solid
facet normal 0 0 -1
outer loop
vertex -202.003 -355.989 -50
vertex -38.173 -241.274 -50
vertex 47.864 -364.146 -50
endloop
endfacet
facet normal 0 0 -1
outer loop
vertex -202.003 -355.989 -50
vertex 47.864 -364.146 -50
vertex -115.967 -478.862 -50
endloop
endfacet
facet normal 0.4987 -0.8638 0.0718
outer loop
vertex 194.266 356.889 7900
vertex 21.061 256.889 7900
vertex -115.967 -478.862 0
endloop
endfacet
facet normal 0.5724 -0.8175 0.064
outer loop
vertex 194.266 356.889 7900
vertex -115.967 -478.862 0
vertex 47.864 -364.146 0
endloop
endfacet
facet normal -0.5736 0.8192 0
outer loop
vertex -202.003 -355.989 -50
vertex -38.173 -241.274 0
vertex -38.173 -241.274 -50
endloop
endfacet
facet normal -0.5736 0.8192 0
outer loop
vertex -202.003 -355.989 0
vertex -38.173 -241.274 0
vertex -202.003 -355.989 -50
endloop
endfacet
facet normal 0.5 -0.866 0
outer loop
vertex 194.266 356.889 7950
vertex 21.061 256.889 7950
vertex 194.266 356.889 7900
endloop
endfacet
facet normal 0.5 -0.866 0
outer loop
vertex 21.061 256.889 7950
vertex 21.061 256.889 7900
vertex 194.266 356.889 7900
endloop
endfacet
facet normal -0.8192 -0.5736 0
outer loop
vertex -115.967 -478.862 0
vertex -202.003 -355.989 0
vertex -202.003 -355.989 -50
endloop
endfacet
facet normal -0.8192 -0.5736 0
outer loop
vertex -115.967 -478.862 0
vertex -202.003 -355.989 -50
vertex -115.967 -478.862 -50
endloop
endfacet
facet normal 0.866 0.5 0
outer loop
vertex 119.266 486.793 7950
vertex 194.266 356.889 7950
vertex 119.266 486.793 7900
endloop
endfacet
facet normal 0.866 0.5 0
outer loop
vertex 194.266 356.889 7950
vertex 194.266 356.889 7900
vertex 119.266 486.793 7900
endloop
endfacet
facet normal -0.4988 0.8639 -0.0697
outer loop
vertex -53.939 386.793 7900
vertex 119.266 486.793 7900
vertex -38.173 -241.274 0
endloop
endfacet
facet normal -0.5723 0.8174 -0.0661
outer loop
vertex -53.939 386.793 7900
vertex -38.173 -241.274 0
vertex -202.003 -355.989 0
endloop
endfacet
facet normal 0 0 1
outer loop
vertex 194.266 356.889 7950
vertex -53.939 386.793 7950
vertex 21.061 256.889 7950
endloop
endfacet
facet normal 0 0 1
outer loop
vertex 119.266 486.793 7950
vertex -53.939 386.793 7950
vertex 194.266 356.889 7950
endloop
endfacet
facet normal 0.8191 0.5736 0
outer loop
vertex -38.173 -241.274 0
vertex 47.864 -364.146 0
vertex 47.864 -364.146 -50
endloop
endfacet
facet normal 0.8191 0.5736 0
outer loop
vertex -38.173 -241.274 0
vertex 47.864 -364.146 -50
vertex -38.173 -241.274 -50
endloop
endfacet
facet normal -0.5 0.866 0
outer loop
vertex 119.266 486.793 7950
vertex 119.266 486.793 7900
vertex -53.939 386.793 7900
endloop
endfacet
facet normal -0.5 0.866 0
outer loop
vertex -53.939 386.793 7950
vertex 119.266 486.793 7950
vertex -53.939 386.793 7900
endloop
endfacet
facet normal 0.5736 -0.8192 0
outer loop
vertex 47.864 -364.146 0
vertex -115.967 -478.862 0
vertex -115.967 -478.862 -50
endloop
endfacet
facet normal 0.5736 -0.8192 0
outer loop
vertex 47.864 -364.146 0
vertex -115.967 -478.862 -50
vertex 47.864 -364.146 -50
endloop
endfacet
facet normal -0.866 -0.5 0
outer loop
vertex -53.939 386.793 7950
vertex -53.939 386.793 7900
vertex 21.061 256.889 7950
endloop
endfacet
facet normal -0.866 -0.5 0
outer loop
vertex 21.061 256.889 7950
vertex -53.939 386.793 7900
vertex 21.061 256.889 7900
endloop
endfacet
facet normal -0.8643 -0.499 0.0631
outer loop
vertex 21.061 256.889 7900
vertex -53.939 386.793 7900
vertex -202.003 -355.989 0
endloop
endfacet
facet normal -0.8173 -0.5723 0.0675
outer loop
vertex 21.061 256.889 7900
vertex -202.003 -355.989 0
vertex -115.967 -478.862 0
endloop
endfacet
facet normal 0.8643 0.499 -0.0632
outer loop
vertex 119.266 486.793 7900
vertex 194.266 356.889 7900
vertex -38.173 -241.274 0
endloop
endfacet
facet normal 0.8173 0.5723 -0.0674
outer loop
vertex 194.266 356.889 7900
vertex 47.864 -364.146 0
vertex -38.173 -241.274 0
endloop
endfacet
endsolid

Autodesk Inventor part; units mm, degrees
ref_plane "YZ Plane" through (0, 0, 0) normal (1, 0, 0) x (0, 1, 0)
ref_plane "XZ Plane" through (0, 0, 0) normal (0, 1, 0) x (-1, 0, 0)
sketch "Sketch1" plane through (0, 0, 0) normal (0, 0, 1) x (1, 0, 0)
  line L0 (-202.0032, -355.9888) -> (-38.1728, -241.2736)
  line L1 (-38.1728, -241.2736) -> (47.8637, -364.1464)
  line L2 (-115.9667, -478.8616) -> (-202.0032, -355.9888)
  line L3 (47.8637, -364.1464) -> (-115.9667, -478.8616)
  point P0 (0, 0)
ref_plane "Work Plane2" through (0, 0, 7900) normal (0, 0, 1) x (1, 0, 0)
ref_plane "Work Plane1" through (0, 0, 0) normal (0, 0, 1) x (1, 0, 0)
sketch "Sketch2" plane through (0, 0, 7900) normal (0, 0, 1) x (1, 0, 0)
  line L0 (119.2658, 486.7931) -> (-53.9393, 386.7931) construction
  line L1 (194.2658, 356.8893) -> (119.2658, 486.7931) construction
  line L2 (21.0607, 256.8893) -> (194.2658, 356.8893) construction
  line L3 (-53.9393, 386.7931) -> (21.0607, 256.8893) construction
  line L4 (21.0607, 256.8893) -> (194.2658, 356.8893)
  line L5 (194.2658, 356.8893) -> (119.2658, 486.7931)
  line L6 (119.2658, 486.7931) -> (-53.9393, 386.7931)
  line L7 (-53.9393, 386.7931) -> (21.0607, 256.8893)
  line L8 (21.0607, 256.8893) -> (119.2658, 486.7931) construction
  line L9 (194.2658, 356.8893) -> (-53.9393, 386.7931) construction
  point P0 (0, 0)
  point P1 (70.1633, 371.8412)
loft "Loft1" add profiles "Sketch2", "Sketch1"
sketch "Sketch3" plane through (47.8637, -364.1464, 0) normal (0, 0, -1) x (-0.8192, -0.5736, 0)
  line L0 (200, 0) -> (0, 0) projected
  line L1 (200, 150) -> (200, 0) projected
  line L2 (0, 150) -> (200, 150) projected
  line L3 (0, 0) -> (0, 150) projected
  point P0 (-169.6581, 325.7447)
sketch "Sketch4" plane through (21.0607, 256.8893, 7900) normal (0, 0, 1) x (0.866, 0.5, 0)
  line L0 (0, 0) -> (200, 0) projected
  line L1 (200, 0) -> (200, 150) projected
  line L2 (200, 150) -> (0, 150) projected
  line L3 (0, 150) -> (0, 0) projected
  point P0 (-146.6838, -211.9423)
extrude "Extrusion1" add sketch "Sketch3" along normal blind 50
extrude "Extrusion2" add sketch "Sketch4" along normal blind 50
properties part number "support_beam_segment_0103" material "Wood Shake"
